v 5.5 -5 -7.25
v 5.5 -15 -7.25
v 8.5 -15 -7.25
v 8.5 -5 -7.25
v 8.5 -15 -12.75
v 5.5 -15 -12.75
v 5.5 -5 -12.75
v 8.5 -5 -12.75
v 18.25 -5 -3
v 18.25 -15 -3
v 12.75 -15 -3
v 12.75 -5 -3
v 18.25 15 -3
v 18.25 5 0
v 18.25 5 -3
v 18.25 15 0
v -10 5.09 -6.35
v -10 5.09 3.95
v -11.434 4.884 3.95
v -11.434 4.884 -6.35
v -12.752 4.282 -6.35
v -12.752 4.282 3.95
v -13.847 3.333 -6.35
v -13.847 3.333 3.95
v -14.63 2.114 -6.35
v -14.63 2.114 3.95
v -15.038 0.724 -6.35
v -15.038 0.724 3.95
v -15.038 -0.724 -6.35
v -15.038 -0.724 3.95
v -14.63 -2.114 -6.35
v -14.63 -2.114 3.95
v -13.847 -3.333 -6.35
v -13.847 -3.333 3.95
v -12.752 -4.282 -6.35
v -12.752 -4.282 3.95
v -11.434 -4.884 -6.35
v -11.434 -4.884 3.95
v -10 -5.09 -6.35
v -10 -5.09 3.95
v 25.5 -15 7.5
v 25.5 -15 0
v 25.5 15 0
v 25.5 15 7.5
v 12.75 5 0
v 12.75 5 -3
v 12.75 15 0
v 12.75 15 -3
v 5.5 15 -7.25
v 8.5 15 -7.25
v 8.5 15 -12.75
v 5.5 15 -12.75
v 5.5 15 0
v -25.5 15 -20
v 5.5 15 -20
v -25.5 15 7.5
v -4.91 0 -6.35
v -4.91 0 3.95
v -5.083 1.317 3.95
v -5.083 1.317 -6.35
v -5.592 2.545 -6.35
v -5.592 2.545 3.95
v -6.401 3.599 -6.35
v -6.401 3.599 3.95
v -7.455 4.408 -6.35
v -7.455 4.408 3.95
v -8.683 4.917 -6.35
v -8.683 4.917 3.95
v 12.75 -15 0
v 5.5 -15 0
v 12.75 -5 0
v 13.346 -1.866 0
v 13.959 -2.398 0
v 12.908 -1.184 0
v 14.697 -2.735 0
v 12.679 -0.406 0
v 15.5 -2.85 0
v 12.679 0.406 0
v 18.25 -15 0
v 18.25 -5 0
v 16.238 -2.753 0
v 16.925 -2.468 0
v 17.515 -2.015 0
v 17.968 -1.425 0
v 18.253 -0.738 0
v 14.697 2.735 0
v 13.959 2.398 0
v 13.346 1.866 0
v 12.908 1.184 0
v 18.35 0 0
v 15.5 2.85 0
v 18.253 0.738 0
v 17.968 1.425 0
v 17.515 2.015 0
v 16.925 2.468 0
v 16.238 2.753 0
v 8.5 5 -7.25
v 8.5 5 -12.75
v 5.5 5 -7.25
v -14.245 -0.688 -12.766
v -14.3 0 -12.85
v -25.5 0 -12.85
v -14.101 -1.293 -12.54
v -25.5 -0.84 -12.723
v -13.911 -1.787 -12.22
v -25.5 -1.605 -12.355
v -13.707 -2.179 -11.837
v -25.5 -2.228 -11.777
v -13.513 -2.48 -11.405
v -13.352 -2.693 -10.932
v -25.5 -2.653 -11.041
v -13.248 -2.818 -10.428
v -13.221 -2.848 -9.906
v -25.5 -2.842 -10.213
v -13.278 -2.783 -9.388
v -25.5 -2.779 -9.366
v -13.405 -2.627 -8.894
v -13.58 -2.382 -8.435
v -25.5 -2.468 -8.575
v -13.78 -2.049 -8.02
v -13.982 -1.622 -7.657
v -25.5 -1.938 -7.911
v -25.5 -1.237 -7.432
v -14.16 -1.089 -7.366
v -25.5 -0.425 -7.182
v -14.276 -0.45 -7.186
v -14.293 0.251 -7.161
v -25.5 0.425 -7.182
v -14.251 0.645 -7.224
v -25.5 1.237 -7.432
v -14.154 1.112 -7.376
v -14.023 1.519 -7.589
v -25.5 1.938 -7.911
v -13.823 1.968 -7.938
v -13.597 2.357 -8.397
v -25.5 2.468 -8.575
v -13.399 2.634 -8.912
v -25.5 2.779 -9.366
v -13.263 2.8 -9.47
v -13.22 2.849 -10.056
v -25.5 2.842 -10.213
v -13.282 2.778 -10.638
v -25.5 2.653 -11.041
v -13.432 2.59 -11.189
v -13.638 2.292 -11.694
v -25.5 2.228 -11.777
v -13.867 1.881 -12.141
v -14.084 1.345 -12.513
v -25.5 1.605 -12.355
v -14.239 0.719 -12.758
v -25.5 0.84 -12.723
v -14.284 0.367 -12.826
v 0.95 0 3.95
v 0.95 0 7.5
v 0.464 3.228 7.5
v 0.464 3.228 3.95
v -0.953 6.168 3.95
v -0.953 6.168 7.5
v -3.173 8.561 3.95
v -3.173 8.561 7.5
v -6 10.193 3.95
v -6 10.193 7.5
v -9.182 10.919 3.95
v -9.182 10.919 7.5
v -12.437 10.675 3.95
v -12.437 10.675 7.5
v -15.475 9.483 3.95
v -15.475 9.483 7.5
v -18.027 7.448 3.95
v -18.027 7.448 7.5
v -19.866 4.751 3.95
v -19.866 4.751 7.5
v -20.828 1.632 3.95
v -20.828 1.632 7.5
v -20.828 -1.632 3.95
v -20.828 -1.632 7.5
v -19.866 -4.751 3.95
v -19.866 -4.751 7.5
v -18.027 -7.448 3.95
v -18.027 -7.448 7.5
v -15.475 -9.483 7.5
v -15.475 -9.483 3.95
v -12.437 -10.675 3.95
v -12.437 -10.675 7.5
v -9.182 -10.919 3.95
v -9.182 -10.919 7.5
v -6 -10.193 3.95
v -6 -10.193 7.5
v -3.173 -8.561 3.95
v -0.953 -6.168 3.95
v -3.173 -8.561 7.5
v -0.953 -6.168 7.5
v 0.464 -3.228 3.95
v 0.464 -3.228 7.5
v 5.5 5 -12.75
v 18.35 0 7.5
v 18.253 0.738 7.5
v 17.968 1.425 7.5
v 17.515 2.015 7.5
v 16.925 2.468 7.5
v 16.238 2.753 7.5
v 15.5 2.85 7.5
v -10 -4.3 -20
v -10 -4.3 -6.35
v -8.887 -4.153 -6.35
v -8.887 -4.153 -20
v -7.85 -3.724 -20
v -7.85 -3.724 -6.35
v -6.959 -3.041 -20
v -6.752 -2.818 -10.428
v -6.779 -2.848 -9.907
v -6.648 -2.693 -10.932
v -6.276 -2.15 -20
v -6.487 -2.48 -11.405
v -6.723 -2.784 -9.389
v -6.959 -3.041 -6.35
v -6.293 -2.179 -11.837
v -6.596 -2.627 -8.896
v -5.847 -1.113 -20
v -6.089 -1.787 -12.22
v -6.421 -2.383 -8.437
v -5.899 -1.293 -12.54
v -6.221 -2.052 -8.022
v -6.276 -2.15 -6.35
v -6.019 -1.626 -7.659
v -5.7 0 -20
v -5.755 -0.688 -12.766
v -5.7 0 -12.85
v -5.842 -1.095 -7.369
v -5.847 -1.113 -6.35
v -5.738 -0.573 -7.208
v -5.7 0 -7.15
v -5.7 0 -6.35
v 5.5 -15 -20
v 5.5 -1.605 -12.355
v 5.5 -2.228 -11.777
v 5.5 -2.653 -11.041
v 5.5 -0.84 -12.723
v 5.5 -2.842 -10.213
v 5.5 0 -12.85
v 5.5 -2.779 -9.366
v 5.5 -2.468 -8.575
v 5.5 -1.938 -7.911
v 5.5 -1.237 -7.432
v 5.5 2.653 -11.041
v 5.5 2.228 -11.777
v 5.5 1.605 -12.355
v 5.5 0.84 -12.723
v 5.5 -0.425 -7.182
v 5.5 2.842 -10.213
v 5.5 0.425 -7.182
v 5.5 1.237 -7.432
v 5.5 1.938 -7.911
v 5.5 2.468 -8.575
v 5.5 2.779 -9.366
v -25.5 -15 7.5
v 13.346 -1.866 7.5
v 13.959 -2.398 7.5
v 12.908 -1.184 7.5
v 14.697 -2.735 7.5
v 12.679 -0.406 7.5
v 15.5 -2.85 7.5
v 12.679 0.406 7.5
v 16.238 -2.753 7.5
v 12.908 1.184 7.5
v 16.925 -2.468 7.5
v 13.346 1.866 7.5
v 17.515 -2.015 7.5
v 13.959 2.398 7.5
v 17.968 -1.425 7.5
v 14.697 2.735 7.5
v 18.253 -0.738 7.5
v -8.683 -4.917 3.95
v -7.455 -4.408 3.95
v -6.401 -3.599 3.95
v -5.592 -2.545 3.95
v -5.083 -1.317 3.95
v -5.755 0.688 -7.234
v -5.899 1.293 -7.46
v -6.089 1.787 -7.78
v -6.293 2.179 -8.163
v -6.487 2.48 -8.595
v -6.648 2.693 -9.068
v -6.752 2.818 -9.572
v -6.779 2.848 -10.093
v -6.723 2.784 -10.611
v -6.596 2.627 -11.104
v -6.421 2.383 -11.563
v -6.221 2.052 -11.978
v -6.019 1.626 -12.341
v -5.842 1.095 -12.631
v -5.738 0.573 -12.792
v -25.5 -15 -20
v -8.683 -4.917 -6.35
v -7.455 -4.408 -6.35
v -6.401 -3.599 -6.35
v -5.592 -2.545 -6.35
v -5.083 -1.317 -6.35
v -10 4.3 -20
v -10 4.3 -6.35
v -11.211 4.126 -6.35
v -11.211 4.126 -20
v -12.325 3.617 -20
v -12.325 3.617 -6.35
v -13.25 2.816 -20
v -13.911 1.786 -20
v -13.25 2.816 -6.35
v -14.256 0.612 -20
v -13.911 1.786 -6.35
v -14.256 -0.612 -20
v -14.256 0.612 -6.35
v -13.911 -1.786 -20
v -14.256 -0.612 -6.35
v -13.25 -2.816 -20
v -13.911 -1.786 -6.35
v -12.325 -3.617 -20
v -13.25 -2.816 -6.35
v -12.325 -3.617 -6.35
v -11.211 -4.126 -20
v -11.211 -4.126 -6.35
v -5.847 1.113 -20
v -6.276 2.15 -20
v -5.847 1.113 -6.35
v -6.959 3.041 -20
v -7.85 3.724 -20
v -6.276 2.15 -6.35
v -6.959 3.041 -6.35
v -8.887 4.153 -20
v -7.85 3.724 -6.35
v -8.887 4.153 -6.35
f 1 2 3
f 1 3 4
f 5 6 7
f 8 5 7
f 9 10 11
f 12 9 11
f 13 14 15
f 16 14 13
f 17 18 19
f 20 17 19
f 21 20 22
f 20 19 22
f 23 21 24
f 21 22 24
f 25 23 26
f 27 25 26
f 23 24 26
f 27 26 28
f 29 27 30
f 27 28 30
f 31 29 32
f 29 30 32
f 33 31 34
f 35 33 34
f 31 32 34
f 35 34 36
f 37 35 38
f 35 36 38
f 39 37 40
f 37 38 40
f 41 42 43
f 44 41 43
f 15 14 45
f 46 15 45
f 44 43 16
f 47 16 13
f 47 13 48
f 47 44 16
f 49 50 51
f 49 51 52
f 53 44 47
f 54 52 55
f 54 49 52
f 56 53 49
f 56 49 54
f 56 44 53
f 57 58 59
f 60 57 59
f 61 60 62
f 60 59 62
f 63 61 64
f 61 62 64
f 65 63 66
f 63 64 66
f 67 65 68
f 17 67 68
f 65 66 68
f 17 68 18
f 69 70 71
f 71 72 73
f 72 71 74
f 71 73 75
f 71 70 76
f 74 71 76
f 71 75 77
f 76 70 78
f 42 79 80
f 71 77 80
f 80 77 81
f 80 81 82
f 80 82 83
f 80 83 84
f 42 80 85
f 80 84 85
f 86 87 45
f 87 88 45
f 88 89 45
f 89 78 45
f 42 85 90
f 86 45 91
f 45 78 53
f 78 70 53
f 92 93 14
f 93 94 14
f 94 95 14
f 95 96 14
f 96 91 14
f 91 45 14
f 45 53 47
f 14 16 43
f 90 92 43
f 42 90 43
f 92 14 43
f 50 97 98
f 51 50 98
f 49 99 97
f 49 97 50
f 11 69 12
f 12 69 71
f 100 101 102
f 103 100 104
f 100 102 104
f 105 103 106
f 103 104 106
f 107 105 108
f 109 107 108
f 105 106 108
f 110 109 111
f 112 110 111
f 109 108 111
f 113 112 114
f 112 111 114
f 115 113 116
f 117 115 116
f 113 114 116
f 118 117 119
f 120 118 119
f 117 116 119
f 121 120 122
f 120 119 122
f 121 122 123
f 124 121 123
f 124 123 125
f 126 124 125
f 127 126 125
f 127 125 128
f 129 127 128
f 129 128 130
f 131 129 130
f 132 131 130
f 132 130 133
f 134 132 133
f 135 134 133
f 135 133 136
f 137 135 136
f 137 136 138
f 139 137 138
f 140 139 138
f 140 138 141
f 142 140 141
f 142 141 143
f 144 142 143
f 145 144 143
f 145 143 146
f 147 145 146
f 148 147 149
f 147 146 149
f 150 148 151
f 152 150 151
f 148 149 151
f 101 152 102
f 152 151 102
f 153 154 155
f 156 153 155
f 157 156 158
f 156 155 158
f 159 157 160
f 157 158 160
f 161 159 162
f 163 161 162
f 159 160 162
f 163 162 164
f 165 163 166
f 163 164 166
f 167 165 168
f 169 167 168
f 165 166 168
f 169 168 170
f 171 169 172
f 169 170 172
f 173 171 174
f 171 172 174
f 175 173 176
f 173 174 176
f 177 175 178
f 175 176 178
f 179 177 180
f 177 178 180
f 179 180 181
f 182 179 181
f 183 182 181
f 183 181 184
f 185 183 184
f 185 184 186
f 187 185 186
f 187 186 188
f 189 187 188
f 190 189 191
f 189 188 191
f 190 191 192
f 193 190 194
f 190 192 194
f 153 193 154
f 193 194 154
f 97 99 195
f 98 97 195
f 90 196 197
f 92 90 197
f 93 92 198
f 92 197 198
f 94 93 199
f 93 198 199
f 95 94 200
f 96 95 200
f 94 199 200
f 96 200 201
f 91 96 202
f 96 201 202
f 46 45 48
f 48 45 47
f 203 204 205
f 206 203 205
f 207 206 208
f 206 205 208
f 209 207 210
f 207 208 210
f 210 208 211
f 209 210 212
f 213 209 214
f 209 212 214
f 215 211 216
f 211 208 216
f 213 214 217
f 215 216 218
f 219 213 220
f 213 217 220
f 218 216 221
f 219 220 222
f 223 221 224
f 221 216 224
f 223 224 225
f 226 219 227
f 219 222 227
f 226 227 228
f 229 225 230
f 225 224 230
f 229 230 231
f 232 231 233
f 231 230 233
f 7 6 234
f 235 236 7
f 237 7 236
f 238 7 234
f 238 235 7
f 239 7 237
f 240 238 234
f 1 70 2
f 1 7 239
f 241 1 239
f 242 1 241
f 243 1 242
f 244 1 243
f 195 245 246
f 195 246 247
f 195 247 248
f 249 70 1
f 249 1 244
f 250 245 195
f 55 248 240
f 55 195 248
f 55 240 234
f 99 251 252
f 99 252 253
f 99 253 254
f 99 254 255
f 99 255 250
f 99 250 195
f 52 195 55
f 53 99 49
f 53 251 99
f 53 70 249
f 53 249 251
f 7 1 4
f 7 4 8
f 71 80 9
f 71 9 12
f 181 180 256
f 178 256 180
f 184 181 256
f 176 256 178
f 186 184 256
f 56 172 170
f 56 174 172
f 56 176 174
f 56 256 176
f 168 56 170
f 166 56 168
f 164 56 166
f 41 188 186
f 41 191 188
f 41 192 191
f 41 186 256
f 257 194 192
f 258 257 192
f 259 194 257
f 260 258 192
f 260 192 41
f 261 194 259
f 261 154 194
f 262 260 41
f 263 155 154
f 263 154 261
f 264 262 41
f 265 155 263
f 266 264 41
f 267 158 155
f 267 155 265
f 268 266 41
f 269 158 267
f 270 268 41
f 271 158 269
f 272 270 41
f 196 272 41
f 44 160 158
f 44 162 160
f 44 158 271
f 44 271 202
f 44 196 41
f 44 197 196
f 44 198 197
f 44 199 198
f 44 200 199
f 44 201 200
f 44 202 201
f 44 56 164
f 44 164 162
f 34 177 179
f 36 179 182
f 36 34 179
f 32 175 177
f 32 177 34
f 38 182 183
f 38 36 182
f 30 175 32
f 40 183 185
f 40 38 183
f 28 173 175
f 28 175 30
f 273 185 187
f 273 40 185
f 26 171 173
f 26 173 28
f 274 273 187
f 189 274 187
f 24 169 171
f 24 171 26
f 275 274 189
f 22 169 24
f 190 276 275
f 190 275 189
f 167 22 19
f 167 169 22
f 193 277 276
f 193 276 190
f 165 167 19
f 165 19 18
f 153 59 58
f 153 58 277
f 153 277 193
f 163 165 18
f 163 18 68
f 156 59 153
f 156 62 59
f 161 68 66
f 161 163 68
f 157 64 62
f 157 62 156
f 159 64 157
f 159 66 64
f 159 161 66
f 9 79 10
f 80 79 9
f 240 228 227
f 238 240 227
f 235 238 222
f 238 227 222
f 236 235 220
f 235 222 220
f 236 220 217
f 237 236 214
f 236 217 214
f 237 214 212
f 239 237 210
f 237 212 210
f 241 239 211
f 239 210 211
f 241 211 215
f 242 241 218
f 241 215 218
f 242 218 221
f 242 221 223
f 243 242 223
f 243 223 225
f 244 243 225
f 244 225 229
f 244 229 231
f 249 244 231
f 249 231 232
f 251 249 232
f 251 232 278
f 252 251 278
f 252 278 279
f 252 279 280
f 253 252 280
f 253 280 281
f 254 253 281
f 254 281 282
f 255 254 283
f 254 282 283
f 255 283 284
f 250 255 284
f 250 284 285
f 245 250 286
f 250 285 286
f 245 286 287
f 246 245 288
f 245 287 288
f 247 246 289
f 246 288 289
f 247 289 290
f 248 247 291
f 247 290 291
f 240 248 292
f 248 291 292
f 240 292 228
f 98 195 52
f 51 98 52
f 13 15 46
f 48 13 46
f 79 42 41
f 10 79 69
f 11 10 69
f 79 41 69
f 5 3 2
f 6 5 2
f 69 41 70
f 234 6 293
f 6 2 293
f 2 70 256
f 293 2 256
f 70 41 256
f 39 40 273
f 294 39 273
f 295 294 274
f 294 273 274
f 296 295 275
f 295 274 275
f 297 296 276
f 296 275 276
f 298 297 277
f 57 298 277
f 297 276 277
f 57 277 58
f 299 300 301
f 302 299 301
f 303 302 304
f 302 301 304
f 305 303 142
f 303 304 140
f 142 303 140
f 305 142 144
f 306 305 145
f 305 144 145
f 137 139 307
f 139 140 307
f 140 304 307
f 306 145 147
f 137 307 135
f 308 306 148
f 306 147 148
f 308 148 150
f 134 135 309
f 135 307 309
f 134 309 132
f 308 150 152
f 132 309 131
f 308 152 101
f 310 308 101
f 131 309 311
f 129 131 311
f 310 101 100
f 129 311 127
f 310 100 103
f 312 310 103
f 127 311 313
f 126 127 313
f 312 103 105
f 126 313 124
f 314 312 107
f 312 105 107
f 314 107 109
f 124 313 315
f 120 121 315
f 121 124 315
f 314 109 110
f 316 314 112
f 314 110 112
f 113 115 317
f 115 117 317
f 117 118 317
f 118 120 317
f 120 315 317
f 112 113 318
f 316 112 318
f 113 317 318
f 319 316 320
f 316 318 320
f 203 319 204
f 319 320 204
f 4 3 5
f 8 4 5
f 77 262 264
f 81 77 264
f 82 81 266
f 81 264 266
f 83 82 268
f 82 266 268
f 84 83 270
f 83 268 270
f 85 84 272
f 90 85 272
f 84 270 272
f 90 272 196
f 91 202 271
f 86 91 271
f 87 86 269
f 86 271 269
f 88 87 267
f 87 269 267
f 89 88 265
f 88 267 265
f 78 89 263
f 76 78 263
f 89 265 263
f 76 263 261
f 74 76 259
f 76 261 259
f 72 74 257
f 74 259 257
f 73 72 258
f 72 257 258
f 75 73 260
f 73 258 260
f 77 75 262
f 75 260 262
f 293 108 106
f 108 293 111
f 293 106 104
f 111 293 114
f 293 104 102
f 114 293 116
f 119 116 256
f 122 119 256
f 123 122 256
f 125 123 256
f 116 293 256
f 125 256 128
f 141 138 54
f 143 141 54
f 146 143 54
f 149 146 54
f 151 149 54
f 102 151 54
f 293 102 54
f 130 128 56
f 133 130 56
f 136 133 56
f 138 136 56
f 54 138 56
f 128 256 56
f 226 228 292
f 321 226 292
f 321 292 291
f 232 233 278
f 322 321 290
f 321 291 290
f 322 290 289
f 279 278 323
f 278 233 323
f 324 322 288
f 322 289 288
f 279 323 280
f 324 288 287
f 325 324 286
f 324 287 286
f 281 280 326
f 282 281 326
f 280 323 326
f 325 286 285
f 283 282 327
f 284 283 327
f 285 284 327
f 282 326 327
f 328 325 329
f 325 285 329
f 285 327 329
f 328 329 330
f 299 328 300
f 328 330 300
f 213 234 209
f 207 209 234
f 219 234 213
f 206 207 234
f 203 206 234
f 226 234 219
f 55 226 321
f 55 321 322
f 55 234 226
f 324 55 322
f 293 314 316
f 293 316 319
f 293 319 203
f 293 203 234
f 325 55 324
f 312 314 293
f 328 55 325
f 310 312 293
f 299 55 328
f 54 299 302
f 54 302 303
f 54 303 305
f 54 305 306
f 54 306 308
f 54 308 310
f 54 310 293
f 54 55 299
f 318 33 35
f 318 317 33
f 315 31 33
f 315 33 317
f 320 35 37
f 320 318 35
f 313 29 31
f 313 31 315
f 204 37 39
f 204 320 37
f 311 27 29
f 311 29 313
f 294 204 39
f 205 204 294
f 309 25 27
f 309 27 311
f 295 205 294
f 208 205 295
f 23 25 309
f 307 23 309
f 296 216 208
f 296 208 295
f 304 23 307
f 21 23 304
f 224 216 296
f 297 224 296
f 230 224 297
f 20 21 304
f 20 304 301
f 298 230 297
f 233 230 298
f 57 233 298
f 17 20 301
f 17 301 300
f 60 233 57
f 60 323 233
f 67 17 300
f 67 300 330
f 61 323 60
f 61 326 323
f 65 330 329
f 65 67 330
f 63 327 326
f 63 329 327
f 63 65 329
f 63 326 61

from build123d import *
from build123d.topology import SkipClean

# Parameters (mm, degrees)
SKETCH_1_W           = 51
SKETCH_1_H           = 30
EXTRUDE_5_DEPTH      = 7.5
SKETCH_4_W           = 31
SKETCH_4_H           = 30
EXTRUDE_6_DEPTH      = 20
SKETCH_6_W           = 5.5
SKETCH_6_H           = 10
EXTRUDE_9_DEPTH      = 3
SKETCH_10_W          = 5.5
SKETCH_10_H          = 10
EXTRUDE_10_DEPTH     = 3
SKETCH_13_R          = 10.95
CUT_EXTRUDE_1_DEPTH  = 3.55
CUT_EXTRUDE_2_DEPTH  = 10.3
CUT_EXTRUDE_3_DEPTH  = 33.666075675
CUT_EXTRUDE_5_DEPTH  = 41.391830857
CUT_EXTRUDE_7_DEPTH  = 57.797887285
EXTRUDE_12_DEPTH     = 31
CUT_EXTRUDE_13_DEPTH = 57.79788732
EXTRUDE_14_DEPTH     = 7.5
CUT_EXTRUDE_14_DEPTH = 41.391830988


with BuildPart() as part:
    # Эскиз1 → Бобышка-Вытянуть5 (new body)
    with BuildSketch(Plane.XY):
        Rectangle(SKETCH_1_W, SKETCH_1_H)
    extrude(amount=EXTRUDE_5_DEPTH)

    # Эскиз4 → Бобышка-Вытянуть6 (add)
    with BuildSketch(Plane(origin=(0, 0, 0), x_dir=(-1, 0, 0), z_dir=(0, 0, -1))):
        with Locations((10, 0)):
            Rectangle(SKETCH_4_W, SKETCH_4_H)
    extrude(amount=EXTRUDE_6_DEPTH)

    # Эскиз6 → Бобышка-Вытянуть9 (add)
    with BuildSketch(Plane(origin=(0, 0, 0), x_dir=(-1, 0, 0), z_dir=(0, 0, -1))):
        with Locations((-15.5, 10)):
            Rectangle(SKETCH_6_W, SKETCH_6_H)
        with Locations((-15.5, -10)):
            Rectangle(SKETCH_6_W, SKETCH_6_H)
    extrude(amount=EXTRUDE_9_DEPTH)

    # Эскиз10 → Бобышка-Вытянуть10 (add)
    with BuildSketch(Plane(origin=(5.5, 0, 0), x_dir=(0, 0, -1), z_dir=(1, 0, 0))):
        with Locations((10, 10)):
            Rectangle(SKETCH_10_W, SKETCH_10_H)
        with Locations((10, -10)):
            Rectangle(SKETCH_10_W, SKETCH_10_H)
    extrude(amount=EXTRUDE_10_DEPTH)

    # Эскиз13 → Вырез-Вытянуть1 (cut)
    with BuildSketch(Plane.XY.offset(7.5)):
        with Locations((-10, 0)):
            Circle(SKETCH_13_R)
    extrude(amount=-CUT_EXTRUDE_1_DEPTH, mode=Mode.SUBTRACT)

    # Эскиз14 → Вырез-Вытянуть2 (cut)
    with BuildSketch(Plane.XY.offset(3.95)):
        with BuildLine():
            ThreePointArc((-4.91, 0), (-6.400826484, 3.599173516), (-10, 5.09))
            Line((-10, 5.09), (-10, -5.09))
            ThreePointArc((-10, -5.09), (-6.400826484, -3.599173516), (-4.91, 0))
        make_face()
        with BuildLine():
            Line((-10, -5.09), (-10, 5.09))
            ThreePointArc((-10, 5.09), (-15.09, 0), (-10, -5.09))
        make_face()
    extrude(amount=-CUT_EXTRUDE_2_DEPTH, mode=Mode.SUBTRACT)

    # Эскиз15 → Вырез-Вытянуть3 (cut, through all)
    with BuildSketch(Plane.XY.offset(-6.35)):
        with BuildLine():
            ThreePointArc((-5.7, 0), (-6.959440841, 3.040559159), (-10, 4.3))
            Line((-10, 4.3), (-10, -4.3))
            ThreePointArc((-10, -4.3), (-6.959440841, -3.040559159), (-5.7, 0))
        make_face()
        with BuildLine():
            Line((-10, -4.3), (-10, 4.3))
            ThreePointArc((-10, 4.3), (-14.3, 0), (-10, -4.3))
        make_face()
    extrude(amount=-CUT_EXTRUDE_3_DEPTH, mode=Mode.SUBTRACT)

    # Эскиз16 → Вырез-Вытянуть5 (cut, through all)
    with BuildSketch(Plane.XY.offset(7.5)):
        with BuildLine():
            ThreePointArc((18.3, 0), (17.479898987, 1.979898987), (15.5, 2.8))
            Line((15.5, 2.8), (15.5, -2.8))
            ThreePointArc((15.5, -2.8), (17.479898987, -1.979898987), (18.3, 0))
        make_face()
        with BuildLine():
            Line((15.5, -2.8), (15.5, 2.8))
            ThreePointArc((15.5, 2.8), (12.7, 0), (15.5, -2.8))
        make_face()
    extrude(amount=-CUT_EXTRUDE_5_DEPTH, mode=Mode.SUBTRACT)

    # Эскиз17 → Вырез-Вытянуть7 (cut, through all)
    with SkipClean():  # the faces are left unmerged after this step: merging them gives an invalid solid
        with BuildSketch(Plane.ZY.offset(25.5)):
            with BuildLine():
                ThreePointArc((-12.6, 0), (-10, -2.6), (-7.4, 0))
                Line((-7.4, 0), (-12.6, 0))
            make_face()
            with BuildLine():
                Line((-12.6, 0), (-7.4, 0))
                ThreePointArc((-7.4, 0), (-10, 2.6), (-12.6, 0))
            make_face()
        extrude(amount=-CUT_EXTRUDE_7_DEPTH, mode=Mode.SUBTRACT)

    # Эскиз23 → Бобышка-Вытянуть12 (add)
    with SkipClean():  # the faces are left unmerged after this step: merging them gives an invalid solid
        with BuildSketch(Plane.ZY.offset(25.5)):
            with BuildLine():
                ThreePointArc((-12.6, 0), (-10, -2.6), (-7.4, 0))
                Line((-7.4, 0), (-12.6, 0))
            make_face()
            with BuildLine():
                Line((-12.6, 0), (-7.4, 0))
                ThreePointArc((-7.4, 0), (-10, 2.6), (-12.6, 0))
            make_face()
        extrude(amount=-EXTRUDE_12_DEPTH)

    # Эскиз24 → Вырез-Вытянуть13 (cut, through all)
    with BuildSketch(Plane.ZY.offset(25.5)):
        with BuildLine():
            ThreePointArc((-7.15, 0), (-10, 2.85), (-12.85, 0))
            Line((-12.85, 0), (-7.15, 0))
        make_face()
        with BuildLine():
            Line((-7.15, 0), (-12.85, 0))
            ThreePointArc((-12.85, 0), (-10, -2.85), (-7.15, 0))
        make_face()
    extrude(amount=-CUT_EXTRUDE_13_DEPTH, mode=Mode.SUBTRACT)

    # Эскиз27 → Бобышка-Вытянуть14 (add)
    with BuildSketch(Plane.XY.offset(7.5)):
        with BuildLine():
            ThreePointArc((15.5, 2.8), (12.7, 0), (15.5, -2.8))
            Line((15.5, -2.8), (15.5, 2.8))
        make_face()
        with BuildLine():
            Line((15.5, 2.8), (15.5, -2.8))
            ThreePointArc((15.5, -2.8), (17.479898987, -1.979898987), (18.3, 0))
            ThreePointArc((18.3, 0), (17.479898987, 1.979898987), (15.5, 2.8))
        make_face()
    extrude(amount=-EXTRUDE_14_DEPTH)

    # Эскиз28 → Вырез-Вытянуть14 (cut, through all)
    with BuildSketch(Plane.XY.offset(7.5)):
        with BuildLine():
            ThreePointArc((15.5, 2.85), (12.65, 0), (15.5, -2.85))
            Line((15.5, -2.85), (15.5, 2.85))
        make_face()
        with BuildLine():
            Line((15.5, 2.85), (15.5, -2.85))
            ThreePointArc((15.5, -2.85), (17.515254326, -2.015254326), (18.35, 0))
            ThreePointArc((18.35, 0), (17.515254326, 2.015254326), (15.5, 2.85))
        make_face()
    extrude(amount=-CUT_EXTRUDE_14_DEPTH, mode=Mode.SUBTRACT)


solid = part.part
